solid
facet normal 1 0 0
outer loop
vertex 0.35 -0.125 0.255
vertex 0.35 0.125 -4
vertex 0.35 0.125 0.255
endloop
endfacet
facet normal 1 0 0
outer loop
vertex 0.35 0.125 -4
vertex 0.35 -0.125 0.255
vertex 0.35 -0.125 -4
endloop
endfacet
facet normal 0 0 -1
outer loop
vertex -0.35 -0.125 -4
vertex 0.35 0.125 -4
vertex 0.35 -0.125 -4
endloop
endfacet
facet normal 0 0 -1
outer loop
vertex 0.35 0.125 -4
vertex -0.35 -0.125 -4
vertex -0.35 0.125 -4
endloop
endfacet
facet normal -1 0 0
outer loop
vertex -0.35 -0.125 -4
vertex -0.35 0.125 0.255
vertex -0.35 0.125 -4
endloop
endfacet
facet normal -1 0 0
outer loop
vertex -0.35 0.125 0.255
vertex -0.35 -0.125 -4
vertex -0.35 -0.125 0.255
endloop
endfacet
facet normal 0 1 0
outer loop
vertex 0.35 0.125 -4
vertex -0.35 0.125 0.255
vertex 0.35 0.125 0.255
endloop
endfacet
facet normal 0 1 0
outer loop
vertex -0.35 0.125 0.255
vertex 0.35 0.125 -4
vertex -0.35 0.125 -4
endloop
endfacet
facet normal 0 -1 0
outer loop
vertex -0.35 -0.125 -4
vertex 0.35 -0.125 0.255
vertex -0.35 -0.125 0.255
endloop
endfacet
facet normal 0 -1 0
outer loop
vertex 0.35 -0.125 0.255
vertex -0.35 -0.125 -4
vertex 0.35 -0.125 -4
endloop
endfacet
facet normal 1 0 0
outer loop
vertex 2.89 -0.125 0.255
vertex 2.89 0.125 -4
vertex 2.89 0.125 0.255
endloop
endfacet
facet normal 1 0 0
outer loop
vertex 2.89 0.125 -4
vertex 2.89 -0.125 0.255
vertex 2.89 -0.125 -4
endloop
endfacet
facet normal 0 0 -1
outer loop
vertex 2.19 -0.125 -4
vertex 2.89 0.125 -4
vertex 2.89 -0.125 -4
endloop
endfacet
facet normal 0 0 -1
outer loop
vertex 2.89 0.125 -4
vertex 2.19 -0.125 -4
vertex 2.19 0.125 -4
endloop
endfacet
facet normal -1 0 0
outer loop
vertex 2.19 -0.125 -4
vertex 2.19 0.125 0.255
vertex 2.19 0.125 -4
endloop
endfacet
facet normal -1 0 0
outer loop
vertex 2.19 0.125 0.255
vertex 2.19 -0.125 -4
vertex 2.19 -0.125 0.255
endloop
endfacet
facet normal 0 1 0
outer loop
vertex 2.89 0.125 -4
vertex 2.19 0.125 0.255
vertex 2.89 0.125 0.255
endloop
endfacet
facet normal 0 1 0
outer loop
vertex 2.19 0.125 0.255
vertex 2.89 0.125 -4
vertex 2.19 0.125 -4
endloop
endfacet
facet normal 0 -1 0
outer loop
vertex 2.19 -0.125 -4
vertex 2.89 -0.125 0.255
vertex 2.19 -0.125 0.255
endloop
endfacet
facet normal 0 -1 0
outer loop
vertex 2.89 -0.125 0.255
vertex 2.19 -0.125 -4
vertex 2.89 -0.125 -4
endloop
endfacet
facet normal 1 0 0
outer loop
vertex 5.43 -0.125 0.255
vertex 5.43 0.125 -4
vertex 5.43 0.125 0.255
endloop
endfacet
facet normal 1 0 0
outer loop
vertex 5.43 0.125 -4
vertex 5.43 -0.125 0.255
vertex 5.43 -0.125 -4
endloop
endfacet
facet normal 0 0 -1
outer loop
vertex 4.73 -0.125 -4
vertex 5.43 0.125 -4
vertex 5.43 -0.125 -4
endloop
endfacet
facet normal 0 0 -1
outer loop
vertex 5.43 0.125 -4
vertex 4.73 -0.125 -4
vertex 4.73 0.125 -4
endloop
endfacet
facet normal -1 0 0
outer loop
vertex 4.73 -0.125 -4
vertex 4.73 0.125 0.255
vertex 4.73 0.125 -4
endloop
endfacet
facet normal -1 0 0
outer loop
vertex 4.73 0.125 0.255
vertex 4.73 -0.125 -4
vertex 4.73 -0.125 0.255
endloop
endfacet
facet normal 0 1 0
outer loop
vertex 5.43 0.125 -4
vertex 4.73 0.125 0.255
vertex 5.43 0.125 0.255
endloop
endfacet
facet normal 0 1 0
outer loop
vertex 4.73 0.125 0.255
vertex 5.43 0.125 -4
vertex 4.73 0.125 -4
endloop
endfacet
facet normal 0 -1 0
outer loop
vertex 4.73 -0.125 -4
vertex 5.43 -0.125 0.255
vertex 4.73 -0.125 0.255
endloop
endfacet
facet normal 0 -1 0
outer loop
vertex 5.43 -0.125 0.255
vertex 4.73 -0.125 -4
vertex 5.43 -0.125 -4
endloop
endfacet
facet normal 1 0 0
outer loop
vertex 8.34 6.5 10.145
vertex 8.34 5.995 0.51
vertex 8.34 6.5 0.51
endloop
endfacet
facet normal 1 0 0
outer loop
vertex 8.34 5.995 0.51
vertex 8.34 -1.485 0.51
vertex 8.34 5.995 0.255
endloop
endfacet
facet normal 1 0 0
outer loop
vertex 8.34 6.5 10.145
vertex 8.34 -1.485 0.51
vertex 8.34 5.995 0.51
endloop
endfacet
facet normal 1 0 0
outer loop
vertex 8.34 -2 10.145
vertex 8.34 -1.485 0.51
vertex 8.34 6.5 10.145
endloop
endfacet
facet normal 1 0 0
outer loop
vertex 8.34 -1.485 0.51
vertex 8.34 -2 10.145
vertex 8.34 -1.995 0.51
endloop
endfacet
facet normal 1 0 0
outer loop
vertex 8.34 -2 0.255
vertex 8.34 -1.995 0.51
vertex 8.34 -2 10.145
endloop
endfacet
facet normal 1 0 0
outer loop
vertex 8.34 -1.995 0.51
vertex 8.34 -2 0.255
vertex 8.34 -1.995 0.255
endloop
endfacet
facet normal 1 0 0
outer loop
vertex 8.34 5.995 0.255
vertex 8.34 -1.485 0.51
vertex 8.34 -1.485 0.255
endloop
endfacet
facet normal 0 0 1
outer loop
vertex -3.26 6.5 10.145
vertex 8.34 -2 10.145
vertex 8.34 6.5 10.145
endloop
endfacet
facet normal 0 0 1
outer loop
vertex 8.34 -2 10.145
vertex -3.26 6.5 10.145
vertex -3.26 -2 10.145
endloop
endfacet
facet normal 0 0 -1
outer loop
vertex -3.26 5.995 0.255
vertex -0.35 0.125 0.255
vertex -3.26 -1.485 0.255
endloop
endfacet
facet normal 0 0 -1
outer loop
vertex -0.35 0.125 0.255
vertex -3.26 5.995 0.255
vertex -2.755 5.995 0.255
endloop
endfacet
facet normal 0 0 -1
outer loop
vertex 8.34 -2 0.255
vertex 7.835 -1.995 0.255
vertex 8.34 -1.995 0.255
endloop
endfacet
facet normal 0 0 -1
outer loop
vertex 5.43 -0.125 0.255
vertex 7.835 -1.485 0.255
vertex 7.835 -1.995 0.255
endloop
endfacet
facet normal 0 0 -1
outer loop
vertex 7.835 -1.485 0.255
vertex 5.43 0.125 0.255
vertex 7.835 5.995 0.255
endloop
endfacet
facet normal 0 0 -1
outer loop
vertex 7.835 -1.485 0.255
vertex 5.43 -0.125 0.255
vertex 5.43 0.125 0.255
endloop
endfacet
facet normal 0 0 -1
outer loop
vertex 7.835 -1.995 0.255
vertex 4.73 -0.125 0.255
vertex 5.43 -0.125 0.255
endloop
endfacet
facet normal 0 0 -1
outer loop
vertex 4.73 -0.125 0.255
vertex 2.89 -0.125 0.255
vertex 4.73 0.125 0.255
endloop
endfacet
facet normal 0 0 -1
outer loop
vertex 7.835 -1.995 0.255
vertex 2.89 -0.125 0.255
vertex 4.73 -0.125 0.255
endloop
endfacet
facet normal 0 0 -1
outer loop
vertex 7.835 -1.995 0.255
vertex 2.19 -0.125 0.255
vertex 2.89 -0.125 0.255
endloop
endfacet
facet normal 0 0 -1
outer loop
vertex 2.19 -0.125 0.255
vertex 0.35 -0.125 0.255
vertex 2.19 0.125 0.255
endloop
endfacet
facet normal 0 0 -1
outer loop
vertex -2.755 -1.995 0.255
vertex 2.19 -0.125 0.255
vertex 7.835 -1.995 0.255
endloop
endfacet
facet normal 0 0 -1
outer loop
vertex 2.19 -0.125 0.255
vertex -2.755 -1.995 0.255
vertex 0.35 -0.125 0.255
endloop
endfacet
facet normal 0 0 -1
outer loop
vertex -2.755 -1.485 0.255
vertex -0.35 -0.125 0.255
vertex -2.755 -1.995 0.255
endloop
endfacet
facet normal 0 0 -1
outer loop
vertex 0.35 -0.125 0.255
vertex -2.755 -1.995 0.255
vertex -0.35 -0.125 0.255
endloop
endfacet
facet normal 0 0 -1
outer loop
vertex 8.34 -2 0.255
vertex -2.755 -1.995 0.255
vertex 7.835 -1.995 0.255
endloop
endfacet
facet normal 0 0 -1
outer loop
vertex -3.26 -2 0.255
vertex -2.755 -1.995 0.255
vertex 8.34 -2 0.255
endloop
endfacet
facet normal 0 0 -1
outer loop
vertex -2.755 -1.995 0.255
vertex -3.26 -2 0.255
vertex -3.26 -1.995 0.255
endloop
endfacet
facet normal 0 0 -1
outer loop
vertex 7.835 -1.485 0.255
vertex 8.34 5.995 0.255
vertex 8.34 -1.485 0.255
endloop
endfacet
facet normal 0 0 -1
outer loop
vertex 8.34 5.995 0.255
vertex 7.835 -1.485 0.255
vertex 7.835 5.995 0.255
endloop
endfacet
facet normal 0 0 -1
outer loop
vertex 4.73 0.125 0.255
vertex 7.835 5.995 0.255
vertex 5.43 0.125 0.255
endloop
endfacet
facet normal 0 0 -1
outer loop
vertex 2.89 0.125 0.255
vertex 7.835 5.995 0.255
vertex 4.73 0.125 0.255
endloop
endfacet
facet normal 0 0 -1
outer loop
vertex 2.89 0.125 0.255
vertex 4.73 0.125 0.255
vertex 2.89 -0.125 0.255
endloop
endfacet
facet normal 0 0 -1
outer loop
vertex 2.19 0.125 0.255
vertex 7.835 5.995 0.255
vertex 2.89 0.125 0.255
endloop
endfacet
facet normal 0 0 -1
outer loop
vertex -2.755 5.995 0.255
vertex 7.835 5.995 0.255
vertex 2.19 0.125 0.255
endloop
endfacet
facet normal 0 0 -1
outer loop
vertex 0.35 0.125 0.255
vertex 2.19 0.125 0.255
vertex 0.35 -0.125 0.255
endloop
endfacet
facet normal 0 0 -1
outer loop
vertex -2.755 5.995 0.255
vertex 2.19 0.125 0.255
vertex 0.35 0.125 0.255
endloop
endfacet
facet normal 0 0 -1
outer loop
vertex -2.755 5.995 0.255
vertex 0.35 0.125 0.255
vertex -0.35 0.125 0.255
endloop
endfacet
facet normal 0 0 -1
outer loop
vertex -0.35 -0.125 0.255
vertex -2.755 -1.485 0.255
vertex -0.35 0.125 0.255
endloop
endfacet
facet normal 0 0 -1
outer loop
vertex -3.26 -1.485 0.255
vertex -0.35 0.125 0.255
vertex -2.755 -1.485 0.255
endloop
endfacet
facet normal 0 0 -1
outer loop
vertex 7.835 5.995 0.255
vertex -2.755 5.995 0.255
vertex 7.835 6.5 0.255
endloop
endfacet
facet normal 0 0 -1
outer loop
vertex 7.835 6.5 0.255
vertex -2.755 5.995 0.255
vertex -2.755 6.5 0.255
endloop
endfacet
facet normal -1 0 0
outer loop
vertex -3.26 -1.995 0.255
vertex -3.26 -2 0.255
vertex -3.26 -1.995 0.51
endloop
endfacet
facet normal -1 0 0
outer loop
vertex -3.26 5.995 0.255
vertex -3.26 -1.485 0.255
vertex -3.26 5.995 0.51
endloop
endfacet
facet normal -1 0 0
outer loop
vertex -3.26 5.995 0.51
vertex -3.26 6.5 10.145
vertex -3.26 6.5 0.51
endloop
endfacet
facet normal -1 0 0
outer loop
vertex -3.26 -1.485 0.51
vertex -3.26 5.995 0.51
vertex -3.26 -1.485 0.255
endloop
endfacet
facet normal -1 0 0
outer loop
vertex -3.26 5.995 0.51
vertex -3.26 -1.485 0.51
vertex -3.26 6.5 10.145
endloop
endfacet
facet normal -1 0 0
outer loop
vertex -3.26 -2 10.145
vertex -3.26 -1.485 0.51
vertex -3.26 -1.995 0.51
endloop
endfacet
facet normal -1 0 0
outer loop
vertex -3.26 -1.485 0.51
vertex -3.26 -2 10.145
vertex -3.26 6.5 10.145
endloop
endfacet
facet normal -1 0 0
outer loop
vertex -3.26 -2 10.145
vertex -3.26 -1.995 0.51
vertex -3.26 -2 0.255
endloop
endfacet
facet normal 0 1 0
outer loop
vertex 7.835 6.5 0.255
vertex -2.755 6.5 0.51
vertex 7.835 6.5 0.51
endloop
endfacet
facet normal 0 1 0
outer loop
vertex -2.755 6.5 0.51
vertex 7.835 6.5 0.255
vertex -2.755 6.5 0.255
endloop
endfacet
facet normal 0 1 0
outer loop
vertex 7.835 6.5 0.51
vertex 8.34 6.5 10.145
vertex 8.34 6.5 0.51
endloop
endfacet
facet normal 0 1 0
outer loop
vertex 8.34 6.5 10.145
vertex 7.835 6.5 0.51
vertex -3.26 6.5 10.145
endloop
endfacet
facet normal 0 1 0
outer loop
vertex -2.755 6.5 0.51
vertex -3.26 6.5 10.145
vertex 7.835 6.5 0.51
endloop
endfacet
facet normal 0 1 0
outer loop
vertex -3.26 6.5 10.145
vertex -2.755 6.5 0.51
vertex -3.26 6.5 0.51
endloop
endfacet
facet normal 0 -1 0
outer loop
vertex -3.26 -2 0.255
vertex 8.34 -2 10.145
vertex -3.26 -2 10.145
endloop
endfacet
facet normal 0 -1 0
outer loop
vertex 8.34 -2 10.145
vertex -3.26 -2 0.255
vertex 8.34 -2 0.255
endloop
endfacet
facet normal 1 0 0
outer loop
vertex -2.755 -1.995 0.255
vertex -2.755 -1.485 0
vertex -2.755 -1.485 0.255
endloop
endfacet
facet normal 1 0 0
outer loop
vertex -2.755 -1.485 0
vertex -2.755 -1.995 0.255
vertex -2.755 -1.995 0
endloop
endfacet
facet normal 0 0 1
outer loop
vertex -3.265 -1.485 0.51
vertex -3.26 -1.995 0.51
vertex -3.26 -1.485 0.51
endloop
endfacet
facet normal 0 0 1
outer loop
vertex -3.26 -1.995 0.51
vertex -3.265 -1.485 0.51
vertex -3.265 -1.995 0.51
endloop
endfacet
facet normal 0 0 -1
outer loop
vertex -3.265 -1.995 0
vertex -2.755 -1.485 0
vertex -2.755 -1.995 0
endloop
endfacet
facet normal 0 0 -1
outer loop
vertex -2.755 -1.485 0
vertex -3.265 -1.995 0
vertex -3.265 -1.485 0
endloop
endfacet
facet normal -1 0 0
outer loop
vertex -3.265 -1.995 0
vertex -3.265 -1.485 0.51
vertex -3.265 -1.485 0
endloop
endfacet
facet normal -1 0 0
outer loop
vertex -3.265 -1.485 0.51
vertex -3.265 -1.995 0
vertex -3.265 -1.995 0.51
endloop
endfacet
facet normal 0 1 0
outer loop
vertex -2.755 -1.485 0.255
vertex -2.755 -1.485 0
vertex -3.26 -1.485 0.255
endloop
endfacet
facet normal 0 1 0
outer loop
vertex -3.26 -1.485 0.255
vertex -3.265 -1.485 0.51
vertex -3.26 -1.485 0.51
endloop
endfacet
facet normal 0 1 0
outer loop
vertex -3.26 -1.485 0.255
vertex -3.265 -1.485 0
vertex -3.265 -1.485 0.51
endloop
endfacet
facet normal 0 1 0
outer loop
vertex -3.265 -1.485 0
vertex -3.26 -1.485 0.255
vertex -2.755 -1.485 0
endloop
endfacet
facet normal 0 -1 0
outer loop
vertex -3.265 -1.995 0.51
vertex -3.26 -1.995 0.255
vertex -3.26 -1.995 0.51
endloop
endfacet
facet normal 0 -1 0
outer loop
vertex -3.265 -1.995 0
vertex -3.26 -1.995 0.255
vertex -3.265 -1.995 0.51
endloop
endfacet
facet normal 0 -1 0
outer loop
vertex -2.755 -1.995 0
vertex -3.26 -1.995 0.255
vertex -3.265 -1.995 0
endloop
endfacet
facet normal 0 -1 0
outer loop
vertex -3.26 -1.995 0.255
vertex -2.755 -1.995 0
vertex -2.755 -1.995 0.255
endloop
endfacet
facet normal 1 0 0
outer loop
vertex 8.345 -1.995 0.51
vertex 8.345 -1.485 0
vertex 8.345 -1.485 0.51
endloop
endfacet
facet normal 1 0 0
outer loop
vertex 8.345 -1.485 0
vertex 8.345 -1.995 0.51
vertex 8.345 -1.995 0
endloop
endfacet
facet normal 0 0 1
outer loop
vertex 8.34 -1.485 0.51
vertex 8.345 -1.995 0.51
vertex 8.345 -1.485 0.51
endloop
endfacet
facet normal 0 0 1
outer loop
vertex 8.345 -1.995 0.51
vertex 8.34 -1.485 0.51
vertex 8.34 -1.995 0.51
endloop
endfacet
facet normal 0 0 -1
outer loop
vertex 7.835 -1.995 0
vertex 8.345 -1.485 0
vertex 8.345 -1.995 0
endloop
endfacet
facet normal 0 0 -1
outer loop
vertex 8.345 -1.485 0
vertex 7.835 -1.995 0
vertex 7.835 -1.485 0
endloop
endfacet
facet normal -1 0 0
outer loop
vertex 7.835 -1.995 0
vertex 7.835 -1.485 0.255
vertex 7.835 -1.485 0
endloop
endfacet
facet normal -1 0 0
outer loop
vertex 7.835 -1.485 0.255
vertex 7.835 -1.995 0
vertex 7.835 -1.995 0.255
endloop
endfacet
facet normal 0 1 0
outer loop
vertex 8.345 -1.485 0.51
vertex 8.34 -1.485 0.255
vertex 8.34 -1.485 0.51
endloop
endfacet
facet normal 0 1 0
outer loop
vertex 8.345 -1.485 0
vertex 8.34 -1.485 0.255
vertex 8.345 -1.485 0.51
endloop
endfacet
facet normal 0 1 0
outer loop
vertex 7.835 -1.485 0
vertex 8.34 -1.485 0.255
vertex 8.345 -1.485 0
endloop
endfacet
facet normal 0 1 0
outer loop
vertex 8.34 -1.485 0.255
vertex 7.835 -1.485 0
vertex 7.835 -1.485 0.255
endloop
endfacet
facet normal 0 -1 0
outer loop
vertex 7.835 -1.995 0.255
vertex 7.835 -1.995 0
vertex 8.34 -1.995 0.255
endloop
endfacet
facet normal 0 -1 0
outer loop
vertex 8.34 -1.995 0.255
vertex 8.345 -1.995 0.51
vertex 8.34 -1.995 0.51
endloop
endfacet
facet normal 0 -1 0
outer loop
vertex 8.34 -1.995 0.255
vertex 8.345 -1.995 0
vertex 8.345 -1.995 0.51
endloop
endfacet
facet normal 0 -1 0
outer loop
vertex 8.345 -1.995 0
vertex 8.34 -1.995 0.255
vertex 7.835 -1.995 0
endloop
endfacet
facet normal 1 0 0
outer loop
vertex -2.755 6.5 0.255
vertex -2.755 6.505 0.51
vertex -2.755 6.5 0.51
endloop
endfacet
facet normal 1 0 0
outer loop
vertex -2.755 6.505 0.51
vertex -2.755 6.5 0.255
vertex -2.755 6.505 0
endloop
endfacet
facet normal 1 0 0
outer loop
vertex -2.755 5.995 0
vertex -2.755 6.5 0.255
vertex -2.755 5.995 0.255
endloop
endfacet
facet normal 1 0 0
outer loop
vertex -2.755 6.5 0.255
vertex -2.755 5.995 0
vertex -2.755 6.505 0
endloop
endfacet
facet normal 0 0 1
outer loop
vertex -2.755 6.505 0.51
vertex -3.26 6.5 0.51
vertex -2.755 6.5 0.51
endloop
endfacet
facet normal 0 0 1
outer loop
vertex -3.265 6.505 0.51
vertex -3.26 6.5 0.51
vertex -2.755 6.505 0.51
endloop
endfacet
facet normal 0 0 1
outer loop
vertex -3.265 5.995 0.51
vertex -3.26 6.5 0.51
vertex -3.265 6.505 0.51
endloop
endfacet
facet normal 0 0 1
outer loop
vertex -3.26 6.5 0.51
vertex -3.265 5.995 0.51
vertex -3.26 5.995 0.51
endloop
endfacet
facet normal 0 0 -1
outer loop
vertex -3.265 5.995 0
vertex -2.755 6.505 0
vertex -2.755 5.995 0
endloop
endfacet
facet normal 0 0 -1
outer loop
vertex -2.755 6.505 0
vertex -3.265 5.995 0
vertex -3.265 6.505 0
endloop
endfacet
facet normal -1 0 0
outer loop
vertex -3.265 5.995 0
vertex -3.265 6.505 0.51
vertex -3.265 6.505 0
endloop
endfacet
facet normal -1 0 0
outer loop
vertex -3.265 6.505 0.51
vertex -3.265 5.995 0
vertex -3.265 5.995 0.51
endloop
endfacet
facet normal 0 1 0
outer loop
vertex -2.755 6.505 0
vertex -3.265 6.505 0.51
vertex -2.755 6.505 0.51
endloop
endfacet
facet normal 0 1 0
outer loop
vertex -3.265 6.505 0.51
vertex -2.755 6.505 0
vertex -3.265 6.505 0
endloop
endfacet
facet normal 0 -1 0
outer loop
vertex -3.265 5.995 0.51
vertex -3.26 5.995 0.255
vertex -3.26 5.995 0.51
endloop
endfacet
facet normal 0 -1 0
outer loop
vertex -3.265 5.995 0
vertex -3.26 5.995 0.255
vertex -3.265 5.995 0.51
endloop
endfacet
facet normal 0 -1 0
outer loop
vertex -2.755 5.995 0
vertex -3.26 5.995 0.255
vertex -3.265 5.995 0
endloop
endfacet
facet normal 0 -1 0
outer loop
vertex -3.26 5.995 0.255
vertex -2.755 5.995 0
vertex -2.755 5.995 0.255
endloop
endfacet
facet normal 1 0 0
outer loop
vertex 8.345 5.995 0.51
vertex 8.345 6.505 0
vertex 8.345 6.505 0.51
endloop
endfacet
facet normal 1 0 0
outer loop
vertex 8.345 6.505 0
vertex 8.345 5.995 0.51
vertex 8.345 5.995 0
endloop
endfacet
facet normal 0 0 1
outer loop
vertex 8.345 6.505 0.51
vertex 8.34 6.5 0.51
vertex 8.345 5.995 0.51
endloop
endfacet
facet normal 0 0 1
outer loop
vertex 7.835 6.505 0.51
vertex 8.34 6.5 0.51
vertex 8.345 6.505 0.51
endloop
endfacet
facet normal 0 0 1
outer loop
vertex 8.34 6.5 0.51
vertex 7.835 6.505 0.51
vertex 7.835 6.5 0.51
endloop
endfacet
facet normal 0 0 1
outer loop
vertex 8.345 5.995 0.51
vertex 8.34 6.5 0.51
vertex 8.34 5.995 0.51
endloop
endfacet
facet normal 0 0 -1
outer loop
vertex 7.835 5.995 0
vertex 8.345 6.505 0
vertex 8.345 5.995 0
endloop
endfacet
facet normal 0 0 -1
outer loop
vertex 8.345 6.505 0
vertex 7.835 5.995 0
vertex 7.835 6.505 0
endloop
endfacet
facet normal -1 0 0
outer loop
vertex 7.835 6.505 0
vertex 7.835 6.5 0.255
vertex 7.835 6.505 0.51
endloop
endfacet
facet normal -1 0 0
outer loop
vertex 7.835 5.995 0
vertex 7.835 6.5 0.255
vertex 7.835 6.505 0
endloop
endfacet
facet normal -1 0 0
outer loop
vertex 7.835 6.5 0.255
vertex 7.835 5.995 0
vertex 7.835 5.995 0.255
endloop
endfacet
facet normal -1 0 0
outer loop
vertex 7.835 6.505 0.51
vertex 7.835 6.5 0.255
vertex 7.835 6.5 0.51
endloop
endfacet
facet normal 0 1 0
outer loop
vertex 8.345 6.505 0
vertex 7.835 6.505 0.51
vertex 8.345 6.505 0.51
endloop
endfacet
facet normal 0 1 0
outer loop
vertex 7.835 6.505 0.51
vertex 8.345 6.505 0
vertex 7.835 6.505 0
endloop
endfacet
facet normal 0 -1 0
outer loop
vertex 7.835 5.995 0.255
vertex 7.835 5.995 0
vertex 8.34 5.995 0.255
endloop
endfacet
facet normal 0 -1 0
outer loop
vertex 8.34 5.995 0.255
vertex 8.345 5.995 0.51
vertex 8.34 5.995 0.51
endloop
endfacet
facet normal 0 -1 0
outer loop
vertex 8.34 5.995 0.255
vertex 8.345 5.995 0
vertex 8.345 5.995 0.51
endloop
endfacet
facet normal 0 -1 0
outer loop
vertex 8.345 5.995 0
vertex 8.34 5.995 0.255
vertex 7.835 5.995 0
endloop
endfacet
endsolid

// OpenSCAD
// dimensions from https://www.recom-power.com/pdf/Innoline/R-78Exx-1.0.pdf

translate([2.54,0,0]) // origin on pin 1
{
    // pin 1
    translate([-2.54,0,-1.85])
    color([.95,.95,.95])
        cube([.7,.25,4.3], center=true);

    // pin 2
    translate([0,0,-1.85])
    color([.95,.95,.95])
        cube([.7,.25,4.3], center=true);

    // pin 3
    translate([2.54,0,-1.85])
    color([.95,.95,.95])
        cube([.7,.25,4.3], center=true);

    // body
    translate([0,2.25,5.2])
    color([.1,.1,.1])
        cube([11.6,8.5,10.4-.51], center=true);
    translate([-5.55,-1.74,.255])
    color([.1,.1,.1])
        cube(.51, center=true);
    translate([5.55,-1.74,.255])
    color([.1,.1,.1])
        cube(.51, center=true);
    translate([-5.55,6.25,.255])
    color([.1,.1,.1])
        cube(.51, center=true);
    translate([5.55,6.25,.255])
    color([.1,.1,.1])
        cube(.51, center=true);
}
